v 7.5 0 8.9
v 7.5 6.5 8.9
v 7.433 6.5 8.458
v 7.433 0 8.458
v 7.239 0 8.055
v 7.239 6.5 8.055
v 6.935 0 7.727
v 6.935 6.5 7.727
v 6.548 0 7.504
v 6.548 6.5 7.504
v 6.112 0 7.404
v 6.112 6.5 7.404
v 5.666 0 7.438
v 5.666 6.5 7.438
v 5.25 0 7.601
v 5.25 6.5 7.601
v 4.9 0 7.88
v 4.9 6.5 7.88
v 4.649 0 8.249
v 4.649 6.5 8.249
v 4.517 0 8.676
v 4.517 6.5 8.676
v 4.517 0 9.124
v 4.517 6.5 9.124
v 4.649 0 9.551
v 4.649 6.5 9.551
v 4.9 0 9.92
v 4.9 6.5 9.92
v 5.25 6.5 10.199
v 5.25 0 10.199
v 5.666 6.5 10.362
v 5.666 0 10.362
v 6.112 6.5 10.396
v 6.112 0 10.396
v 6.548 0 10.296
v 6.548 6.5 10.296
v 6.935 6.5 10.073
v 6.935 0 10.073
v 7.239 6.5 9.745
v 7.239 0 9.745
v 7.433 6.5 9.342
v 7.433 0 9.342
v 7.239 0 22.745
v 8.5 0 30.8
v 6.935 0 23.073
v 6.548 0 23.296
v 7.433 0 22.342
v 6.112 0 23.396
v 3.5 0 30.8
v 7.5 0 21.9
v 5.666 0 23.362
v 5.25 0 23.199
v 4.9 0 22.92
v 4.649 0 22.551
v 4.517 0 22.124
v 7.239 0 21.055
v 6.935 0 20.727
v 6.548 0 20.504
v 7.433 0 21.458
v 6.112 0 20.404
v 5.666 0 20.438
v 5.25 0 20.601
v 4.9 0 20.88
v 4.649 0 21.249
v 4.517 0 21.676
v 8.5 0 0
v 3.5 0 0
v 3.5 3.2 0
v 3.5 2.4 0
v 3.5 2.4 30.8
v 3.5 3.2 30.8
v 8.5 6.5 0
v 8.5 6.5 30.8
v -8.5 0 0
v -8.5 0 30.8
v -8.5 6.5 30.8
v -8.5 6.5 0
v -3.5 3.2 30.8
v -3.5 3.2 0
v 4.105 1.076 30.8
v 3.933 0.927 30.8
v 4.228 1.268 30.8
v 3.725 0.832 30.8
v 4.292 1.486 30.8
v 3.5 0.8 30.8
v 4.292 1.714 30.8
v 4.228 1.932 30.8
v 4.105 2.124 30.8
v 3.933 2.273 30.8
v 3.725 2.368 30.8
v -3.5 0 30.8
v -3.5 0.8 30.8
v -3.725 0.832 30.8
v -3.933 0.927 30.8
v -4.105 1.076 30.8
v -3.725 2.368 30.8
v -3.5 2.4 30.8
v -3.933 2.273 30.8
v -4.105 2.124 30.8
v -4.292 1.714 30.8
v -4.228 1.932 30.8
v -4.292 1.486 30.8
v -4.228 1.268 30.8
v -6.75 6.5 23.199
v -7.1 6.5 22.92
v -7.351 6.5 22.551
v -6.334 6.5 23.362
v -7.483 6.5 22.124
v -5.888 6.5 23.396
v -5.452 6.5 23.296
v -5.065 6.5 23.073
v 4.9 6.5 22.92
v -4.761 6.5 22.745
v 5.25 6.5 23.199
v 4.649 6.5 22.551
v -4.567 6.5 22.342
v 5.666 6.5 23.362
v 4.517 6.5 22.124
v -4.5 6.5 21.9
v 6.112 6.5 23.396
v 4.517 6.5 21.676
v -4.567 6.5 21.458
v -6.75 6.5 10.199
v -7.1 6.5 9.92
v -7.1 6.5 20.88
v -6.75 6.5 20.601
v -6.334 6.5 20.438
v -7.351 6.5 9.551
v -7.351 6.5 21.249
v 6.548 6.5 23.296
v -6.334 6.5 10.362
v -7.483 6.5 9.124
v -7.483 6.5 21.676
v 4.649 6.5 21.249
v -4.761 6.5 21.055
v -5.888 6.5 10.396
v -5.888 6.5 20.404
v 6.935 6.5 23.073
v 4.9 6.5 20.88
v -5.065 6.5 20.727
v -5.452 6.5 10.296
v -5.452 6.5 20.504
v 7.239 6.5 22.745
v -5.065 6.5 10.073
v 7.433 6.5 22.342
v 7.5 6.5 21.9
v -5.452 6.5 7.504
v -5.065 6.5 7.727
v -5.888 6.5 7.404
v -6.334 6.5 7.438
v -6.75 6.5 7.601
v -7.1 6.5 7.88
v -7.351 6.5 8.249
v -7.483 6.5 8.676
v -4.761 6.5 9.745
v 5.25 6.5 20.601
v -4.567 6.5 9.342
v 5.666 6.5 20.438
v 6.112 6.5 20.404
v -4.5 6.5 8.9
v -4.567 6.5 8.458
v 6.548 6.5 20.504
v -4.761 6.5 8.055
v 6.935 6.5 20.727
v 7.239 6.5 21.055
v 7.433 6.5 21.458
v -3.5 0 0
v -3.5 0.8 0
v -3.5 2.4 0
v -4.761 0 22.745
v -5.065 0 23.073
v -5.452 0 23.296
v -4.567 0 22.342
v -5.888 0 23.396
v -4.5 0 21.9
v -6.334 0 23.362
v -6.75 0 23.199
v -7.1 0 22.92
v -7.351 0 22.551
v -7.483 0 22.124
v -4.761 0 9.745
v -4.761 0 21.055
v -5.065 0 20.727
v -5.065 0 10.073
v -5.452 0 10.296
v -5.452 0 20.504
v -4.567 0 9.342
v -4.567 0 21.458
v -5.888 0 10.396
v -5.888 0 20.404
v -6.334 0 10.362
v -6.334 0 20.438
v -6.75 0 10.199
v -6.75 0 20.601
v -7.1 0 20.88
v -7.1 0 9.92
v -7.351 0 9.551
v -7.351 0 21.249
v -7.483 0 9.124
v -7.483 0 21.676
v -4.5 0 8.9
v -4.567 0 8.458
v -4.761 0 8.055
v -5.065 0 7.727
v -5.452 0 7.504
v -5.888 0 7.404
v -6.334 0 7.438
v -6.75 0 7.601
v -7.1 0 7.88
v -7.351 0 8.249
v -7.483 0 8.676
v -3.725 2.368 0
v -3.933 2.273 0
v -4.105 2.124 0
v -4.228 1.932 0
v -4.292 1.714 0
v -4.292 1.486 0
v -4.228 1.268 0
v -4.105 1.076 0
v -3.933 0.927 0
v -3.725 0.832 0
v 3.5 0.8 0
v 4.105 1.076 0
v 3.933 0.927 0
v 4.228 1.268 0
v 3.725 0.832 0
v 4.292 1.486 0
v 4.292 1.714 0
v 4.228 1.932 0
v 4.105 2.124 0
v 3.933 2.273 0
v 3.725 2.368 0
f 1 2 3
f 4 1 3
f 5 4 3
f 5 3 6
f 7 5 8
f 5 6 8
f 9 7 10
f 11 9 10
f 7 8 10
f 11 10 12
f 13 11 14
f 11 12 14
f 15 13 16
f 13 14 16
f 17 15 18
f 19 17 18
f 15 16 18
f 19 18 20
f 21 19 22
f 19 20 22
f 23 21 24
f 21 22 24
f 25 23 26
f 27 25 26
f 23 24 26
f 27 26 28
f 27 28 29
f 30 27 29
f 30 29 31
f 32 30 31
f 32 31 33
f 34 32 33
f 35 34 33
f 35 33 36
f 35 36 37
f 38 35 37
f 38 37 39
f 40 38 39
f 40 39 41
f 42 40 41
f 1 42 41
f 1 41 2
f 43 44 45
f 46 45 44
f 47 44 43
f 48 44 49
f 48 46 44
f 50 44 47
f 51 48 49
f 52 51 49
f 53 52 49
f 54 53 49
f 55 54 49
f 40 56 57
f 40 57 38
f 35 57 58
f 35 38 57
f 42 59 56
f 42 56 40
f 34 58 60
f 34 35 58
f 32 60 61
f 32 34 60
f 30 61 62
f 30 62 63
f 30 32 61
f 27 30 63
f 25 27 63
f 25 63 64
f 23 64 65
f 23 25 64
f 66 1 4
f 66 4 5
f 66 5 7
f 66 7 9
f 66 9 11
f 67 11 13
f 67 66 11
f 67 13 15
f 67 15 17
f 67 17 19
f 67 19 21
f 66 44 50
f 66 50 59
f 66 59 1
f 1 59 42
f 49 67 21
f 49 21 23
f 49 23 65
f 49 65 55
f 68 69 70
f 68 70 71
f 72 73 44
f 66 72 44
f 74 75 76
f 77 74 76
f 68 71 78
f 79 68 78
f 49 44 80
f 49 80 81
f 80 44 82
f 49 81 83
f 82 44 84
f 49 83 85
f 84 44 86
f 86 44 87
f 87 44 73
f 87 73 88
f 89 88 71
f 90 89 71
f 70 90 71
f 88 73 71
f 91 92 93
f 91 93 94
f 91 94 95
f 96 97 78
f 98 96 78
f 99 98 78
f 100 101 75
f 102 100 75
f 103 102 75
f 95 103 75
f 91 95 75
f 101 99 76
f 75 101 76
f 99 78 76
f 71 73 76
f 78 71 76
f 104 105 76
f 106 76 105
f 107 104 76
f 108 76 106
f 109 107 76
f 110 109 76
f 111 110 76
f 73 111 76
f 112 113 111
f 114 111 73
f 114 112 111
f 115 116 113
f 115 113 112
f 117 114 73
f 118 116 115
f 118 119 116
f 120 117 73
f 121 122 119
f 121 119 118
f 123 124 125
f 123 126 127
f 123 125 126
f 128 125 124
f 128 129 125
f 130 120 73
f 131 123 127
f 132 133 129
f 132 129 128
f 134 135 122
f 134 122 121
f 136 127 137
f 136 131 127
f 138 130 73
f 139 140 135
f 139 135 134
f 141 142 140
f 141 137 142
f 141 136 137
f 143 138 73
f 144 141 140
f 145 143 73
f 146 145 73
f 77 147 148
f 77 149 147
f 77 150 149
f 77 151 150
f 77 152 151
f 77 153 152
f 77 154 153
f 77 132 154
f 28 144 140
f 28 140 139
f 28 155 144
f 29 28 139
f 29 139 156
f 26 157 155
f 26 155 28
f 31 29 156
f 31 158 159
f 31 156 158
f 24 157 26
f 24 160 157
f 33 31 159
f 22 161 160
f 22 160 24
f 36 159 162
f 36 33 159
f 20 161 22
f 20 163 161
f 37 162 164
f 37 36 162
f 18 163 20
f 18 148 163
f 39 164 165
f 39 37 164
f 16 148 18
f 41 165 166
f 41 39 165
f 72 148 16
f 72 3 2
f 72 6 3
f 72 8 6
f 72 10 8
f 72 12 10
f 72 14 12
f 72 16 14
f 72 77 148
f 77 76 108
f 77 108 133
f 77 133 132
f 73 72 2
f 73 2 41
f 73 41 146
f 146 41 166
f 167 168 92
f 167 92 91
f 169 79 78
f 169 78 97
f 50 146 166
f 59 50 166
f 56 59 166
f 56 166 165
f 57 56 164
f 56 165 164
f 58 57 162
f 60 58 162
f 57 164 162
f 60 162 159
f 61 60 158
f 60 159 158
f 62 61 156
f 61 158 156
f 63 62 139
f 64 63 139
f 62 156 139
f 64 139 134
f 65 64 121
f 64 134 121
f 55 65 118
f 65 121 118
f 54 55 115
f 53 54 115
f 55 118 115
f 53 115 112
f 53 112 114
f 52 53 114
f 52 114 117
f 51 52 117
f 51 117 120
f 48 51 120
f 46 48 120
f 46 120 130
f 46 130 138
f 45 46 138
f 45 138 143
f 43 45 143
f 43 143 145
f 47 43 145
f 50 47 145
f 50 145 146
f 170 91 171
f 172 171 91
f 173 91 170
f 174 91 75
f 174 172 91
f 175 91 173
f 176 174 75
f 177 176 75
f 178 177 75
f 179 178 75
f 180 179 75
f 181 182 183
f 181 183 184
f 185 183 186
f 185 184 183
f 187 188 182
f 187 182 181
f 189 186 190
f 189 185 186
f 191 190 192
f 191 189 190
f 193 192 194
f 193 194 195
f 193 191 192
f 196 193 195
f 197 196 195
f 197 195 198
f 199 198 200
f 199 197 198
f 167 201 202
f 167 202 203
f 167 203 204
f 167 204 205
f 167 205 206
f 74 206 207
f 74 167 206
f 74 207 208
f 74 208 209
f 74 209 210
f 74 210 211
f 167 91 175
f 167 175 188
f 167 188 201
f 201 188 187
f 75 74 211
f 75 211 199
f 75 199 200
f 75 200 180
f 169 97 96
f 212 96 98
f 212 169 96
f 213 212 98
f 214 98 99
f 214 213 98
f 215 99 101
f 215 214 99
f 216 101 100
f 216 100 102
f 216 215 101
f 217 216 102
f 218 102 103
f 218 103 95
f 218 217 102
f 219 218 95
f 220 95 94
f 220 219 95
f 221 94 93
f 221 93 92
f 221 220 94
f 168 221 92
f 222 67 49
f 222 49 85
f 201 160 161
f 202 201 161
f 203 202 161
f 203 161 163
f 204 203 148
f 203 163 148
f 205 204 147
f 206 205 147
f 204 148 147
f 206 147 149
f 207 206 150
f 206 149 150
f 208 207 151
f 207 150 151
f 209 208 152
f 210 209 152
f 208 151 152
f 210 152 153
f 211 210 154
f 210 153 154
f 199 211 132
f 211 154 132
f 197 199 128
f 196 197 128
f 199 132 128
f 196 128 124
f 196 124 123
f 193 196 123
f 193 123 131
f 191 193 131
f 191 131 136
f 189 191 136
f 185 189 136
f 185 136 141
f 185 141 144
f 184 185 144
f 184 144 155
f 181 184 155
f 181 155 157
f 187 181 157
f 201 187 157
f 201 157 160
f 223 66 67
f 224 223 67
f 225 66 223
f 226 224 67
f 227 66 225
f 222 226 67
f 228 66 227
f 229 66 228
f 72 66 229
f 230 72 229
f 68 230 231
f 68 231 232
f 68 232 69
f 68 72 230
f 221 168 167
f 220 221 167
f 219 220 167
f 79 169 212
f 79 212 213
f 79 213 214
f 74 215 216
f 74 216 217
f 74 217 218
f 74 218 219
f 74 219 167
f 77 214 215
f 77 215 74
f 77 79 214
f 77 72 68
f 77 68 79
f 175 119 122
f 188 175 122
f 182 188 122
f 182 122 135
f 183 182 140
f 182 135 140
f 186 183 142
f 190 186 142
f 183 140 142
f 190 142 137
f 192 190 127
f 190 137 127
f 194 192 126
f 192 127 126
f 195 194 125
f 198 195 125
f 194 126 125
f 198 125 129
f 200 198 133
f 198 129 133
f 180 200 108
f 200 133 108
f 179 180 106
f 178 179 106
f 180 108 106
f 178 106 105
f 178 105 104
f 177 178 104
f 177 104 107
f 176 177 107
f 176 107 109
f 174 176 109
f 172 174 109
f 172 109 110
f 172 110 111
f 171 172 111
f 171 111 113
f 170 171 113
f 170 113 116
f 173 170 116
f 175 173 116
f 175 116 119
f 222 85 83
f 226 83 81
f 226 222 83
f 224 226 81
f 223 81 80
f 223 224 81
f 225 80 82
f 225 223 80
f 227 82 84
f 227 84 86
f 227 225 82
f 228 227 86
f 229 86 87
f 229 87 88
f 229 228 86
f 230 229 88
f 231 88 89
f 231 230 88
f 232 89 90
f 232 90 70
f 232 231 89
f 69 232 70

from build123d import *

# Parameters (mm, degrees)
RESSALTO_EXTRUS_O1_DEPTH = 30.8
ESBO_O2_R                = 1.5
CORTE_EXTRUS_O1_DEPTH    = 30.8


with BuildPart() as part:
    # Esboço1 → Ressalto-extrusão1 (new body)
    with BuildSketch(Plane.XY):
        with BuildLine():
            Line((-8.5, 6.5), (8.5, 6.5))
            Line((8.5, 6.5), (8.5, 0))
            Line((8.5, 0), (3.5, 0))
            Line((3.5, 0), (3.5, 0.8))
            ThreePointArc((3.5, 0.8), (4.3, 1.6), (3.5, 2.4))
            Line((3.5, 2.4), (3.5, 3.2))
            Line((3.5, 3.2), (-3.5, 3.2))
            Line((-3.5, 3.2), (-3.5, 2.4))
            ThreePointArc((-3.5, 2.4), (-4.3, 1.6), (-3.5, 0.8))
            Line((-3.5, 0.8), (-3.5, 0))
            Line((-3.5, 0), (-8.5, 0))
            Line((-8.5, 0), (-8.5, 6.5))
        make_face()
    extrude(amount=RESSALTO_EXTRUS_O1_DEPTH)

    # Esboço2 → Corte-extrusão1 (cut)
    with BuildSketch(Plane(origin=(0, 6.5, 0), x_dir=(1, 0, 0), z_dir=(0, 1, 0))):
        with Locations((6, -21.9)):
            Circle(ESBO_O2_R)
        with Locations((6, -8.9)):
            Circle(ESBO_O2_R)
        with Locations((-6, -21.9)):
            Circle(ESBO_O2_R)
        with Locations((-6, -8.9)):
            Circle(ESBO_O2_R)
    extrude(amount=-CORTE_EXTRUS_O1_DEPTH, mode=Mode.SUBTRACT)


solid = part.part
